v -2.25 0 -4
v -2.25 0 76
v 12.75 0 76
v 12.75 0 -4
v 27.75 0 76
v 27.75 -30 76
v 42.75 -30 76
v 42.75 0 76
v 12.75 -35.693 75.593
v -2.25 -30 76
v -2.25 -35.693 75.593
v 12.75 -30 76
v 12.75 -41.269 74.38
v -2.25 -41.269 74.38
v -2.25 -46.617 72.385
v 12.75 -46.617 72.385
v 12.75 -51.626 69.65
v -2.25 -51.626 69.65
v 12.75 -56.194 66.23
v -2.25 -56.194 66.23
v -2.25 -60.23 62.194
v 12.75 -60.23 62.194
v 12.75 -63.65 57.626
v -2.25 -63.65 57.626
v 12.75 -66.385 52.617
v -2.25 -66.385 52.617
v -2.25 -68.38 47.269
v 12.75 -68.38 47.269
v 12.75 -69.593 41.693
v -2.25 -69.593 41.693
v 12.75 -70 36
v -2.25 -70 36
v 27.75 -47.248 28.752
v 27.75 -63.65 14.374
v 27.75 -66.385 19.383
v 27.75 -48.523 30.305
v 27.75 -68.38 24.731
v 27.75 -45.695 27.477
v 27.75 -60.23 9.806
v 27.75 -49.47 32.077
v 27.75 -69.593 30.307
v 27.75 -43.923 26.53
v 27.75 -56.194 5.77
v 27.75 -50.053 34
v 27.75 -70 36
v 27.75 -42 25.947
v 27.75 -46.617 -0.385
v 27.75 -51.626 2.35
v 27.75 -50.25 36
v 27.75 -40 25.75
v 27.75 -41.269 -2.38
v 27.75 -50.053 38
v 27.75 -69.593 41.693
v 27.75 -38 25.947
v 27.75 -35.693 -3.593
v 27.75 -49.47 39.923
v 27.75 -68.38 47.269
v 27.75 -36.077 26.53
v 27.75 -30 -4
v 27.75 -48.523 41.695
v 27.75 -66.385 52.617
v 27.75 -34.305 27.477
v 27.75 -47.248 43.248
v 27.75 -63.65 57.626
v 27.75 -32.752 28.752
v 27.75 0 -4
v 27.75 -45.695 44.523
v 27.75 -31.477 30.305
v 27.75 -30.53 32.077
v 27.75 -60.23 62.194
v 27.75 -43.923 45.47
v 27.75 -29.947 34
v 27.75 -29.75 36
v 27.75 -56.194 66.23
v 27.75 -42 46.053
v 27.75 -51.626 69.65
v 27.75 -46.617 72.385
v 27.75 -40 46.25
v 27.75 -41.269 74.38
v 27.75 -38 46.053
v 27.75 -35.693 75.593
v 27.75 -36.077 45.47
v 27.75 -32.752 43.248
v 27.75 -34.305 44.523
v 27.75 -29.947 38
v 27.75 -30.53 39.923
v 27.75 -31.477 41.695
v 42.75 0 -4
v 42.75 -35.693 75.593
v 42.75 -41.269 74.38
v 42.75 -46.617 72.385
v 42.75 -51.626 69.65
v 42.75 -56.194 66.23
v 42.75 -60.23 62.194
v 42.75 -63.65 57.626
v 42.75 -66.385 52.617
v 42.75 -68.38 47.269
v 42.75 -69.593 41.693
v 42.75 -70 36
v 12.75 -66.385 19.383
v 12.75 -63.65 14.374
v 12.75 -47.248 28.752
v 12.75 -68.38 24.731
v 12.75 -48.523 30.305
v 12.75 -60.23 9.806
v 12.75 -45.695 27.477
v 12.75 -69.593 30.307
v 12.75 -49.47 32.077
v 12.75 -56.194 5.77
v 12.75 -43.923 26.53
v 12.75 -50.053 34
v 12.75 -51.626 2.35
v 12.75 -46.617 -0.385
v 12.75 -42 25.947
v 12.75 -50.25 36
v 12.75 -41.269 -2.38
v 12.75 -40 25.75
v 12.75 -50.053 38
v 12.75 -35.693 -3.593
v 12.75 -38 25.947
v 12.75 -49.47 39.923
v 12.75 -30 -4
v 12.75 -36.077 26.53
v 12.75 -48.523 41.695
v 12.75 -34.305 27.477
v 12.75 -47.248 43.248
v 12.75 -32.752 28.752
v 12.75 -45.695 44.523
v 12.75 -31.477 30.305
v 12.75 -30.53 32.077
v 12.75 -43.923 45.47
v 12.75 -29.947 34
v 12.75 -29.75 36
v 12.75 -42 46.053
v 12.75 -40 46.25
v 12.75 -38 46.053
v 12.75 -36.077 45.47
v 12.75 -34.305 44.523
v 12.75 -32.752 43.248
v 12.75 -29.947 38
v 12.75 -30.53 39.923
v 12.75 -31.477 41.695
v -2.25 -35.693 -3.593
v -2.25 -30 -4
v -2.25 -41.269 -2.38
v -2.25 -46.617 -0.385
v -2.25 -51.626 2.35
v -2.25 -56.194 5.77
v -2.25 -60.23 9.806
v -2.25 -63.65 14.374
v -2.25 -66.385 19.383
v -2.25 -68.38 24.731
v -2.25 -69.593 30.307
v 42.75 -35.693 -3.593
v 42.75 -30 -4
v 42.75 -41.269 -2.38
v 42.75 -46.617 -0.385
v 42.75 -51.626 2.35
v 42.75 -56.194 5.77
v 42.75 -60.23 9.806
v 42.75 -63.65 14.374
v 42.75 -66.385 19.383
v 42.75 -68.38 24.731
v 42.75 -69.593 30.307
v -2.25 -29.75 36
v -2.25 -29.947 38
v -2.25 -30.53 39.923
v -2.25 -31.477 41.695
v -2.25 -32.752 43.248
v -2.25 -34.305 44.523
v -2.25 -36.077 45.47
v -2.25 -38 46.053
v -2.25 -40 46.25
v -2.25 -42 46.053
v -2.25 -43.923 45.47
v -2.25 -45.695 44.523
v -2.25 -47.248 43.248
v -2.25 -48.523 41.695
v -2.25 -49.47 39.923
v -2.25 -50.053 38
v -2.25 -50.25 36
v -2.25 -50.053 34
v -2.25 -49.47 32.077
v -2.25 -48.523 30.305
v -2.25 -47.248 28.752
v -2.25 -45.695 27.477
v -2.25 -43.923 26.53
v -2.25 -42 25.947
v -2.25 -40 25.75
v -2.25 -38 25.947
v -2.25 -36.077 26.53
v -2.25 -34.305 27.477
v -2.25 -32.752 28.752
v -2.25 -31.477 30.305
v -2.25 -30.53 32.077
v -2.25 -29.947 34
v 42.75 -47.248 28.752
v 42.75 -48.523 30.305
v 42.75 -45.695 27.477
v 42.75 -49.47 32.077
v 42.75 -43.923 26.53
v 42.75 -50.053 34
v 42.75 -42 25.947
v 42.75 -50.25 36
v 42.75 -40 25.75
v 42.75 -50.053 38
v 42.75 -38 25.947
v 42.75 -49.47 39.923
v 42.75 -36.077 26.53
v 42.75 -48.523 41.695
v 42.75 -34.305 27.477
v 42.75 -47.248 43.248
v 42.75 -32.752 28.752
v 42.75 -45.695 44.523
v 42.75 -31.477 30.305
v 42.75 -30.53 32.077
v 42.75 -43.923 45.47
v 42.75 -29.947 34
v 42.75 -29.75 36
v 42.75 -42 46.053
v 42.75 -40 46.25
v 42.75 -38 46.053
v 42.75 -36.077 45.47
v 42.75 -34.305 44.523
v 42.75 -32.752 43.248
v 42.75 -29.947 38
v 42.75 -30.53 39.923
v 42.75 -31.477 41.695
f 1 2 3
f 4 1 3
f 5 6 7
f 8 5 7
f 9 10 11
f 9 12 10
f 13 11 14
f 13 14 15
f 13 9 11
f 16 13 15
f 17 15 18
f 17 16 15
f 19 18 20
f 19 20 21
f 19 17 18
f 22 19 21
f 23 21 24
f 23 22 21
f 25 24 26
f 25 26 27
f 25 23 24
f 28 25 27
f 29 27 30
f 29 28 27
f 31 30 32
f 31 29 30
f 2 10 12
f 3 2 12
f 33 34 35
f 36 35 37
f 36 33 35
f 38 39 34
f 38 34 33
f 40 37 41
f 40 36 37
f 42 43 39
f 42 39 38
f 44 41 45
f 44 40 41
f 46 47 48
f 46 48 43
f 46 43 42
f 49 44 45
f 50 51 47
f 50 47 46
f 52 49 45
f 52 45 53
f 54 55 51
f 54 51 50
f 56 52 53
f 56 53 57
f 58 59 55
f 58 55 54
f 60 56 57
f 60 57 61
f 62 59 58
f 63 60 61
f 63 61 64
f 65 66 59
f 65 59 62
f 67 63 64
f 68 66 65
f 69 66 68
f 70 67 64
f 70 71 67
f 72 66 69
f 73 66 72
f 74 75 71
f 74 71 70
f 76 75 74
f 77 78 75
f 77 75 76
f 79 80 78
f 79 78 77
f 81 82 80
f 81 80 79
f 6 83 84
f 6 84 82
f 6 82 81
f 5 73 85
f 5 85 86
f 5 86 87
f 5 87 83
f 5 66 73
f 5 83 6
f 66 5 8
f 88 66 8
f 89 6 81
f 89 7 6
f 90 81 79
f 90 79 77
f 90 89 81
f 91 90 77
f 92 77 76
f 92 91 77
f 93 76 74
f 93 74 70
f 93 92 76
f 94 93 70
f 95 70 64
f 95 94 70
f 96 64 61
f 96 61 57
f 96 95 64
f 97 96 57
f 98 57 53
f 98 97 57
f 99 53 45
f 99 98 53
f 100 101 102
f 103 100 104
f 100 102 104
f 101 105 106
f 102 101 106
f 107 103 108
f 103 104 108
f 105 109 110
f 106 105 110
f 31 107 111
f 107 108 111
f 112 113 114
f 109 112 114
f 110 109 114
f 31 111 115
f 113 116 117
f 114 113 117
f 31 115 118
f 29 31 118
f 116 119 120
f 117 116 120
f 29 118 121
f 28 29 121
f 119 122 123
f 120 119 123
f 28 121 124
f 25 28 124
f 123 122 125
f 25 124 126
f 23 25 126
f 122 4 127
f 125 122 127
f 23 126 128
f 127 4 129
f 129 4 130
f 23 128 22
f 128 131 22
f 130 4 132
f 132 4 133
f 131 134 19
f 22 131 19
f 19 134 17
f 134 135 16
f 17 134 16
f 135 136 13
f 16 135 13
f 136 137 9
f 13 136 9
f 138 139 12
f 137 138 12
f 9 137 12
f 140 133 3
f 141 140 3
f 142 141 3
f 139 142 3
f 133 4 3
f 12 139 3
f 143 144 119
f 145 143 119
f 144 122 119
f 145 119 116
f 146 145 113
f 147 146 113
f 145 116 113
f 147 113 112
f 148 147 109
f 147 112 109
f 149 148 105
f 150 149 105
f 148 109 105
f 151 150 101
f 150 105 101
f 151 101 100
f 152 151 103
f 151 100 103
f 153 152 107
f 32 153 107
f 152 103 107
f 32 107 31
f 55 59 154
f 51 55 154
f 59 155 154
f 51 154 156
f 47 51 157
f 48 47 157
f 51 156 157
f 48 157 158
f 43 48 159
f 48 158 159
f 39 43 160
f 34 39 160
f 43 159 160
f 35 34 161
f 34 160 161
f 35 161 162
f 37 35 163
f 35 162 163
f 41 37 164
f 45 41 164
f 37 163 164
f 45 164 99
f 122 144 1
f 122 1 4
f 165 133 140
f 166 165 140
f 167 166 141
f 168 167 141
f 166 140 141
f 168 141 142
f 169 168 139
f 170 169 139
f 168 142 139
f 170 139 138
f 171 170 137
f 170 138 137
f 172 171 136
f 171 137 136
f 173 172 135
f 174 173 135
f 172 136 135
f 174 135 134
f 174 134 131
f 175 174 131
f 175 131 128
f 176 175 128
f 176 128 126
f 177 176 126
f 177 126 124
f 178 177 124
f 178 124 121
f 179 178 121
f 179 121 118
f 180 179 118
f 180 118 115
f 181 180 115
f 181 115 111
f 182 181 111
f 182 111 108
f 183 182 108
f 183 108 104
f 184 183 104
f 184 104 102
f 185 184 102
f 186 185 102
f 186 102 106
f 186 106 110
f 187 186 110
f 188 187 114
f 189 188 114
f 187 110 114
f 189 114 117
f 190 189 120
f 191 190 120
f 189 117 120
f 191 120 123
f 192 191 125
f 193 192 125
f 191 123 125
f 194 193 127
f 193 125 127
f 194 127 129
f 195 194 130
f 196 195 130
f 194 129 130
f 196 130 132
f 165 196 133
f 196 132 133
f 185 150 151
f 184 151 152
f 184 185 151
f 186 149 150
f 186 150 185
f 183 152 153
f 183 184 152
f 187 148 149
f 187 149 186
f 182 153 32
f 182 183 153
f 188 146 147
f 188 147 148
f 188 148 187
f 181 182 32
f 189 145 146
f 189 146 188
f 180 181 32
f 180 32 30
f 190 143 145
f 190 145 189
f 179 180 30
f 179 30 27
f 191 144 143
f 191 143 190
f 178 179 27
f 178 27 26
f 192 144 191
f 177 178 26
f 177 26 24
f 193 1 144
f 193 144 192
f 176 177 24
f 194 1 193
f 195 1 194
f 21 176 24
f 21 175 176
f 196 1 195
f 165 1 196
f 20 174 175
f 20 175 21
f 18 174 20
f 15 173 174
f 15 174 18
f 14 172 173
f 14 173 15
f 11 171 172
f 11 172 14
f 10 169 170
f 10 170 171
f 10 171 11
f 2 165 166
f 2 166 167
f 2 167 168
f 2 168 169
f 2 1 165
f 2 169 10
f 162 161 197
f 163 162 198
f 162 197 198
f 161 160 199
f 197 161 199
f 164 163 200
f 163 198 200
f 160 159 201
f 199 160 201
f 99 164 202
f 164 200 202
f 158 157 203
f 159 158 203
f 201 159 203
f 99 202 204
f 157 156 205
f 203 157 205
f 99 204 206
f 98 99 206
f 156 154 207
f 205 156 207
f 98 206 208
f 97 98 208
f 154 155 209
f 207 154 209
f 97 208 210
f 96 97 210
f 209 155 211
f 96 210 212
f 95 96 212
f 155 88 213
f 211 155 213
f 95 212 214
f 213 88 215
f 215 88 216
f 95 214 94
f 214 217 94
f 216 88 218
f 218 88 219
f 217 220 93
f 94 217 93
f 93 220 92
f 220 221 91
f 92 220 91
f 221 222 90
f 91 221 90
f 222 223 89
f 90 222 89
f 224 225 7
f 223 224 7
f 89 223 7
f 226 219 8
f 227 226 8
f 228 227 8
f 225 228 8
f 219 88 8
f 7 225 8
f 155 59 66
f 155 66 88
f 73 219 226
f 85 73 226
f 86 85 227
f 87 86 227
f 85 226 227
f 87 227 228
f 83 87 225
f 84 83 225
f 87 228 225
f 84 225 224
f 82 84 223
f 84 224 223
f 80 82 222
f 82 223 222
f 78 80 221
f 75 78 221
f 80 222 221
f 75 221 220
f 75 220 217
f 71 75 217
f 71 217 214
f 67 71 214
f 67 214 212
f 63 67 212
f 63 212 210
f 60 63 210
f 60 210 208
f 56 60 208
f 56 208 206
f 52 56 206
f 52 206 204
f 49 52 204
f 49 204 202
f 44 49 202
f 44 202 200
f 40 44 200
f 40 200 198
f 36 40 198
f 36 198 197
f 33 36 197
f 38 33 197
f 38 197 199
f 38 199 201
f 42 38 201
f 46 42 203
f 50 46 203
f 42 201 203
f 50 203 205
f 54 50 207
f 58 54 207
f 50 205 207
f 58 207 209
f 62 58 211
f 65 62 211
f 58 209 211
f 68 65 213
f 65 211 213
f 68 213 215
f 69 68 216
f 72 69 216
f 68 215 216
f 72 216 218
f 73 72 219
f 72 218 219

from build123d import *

# Parameters (mm, degrees)
F0_W     = 15
F0_H     = 80
F1_DEPTH = 70
F2_R     = 39.99999
F2_2_R   = 39.99999
F3_R     = 10.25
F4_DEPTH = 86.5
F5_R     = 10.25
F6_DEPTH = 25


# Not quite as in the source:
# - a fillet or chamfer is up to 0.001 mm smaller than in the source, because OpenCascade refuses the exact size


with BuildPart() as f1:
    # F0 (on Front) → F1 (new body)
    with BuildSketch(Plane.XZ):
        with Locations((5.25, 36)):
            Rectangle(F0_W, F0_H)
    extrude(amount=F1_DEPTH)

    # F2 (radius 40 in the source; OpenCascade refuses exactly that, so slightly less here)
    f2_edges = [f1.edges().sort_by_distance(p)[0] for p in [
        (5.25, -70, 76),
        (5.25, -70, -4),
    ]]
    fillet(f2_edges, radius=F2_R)


with BuildPart() as f1b:
    # F0 (on Front) → F1, piece 2 (new body)
    with BuildSketch(Plane.XZ):
        with Locations((35.25, 36)):
            Rectangle(F0_W, F0_H)
    extrude(amount=F1_DEPTH)

    # F2#2 (radius 40 in the source; OpenCascade refuses exactly that, so slightly less here)
    f2_2_edges = [f1b.edges().sort_by_distance(p)[0] for p in [
        (35.25, -70, 76),
        (35.25, -70, -4),
    ]]
    fillet(f2_2_edges, radius=F2_2_R)


with BuildPart() as f4_tool:
    # F3 (on face) → F4 (new body)
    with BuildSketch(Plane.YZ.offset(42.75)):
        with Locations((-40, 36)):
            Circle(F3_R)
    extrude(amount=-F4_DEPTH)


with BuildPart() as f1_1:
    add(f1.part)

    # F4: cut by f4_tool
    add(f4_tool.part, mode=Mode.SUBTRACT)

    # F5 (on face) → F6 (cut)
    with BuildSketch(Plane(origin=(-2.25, 0, 0), x_dir=(0, -1, 0), z_dir=(-1, 0, 0))):
        with Locations((40, 36)):
            Circle(F5_R)
    extrude(amount=-F6_DEPTH, mode=Mode.SUBTRACT)


with BuildPart() as f1b_1:
    add(f1b.part)

    # F4: cut by f4_tool
    add(f4_tool.part, mode=Mode.SUBTRACT)


solid = Compound([f1_1.part, f1b_1.part])
